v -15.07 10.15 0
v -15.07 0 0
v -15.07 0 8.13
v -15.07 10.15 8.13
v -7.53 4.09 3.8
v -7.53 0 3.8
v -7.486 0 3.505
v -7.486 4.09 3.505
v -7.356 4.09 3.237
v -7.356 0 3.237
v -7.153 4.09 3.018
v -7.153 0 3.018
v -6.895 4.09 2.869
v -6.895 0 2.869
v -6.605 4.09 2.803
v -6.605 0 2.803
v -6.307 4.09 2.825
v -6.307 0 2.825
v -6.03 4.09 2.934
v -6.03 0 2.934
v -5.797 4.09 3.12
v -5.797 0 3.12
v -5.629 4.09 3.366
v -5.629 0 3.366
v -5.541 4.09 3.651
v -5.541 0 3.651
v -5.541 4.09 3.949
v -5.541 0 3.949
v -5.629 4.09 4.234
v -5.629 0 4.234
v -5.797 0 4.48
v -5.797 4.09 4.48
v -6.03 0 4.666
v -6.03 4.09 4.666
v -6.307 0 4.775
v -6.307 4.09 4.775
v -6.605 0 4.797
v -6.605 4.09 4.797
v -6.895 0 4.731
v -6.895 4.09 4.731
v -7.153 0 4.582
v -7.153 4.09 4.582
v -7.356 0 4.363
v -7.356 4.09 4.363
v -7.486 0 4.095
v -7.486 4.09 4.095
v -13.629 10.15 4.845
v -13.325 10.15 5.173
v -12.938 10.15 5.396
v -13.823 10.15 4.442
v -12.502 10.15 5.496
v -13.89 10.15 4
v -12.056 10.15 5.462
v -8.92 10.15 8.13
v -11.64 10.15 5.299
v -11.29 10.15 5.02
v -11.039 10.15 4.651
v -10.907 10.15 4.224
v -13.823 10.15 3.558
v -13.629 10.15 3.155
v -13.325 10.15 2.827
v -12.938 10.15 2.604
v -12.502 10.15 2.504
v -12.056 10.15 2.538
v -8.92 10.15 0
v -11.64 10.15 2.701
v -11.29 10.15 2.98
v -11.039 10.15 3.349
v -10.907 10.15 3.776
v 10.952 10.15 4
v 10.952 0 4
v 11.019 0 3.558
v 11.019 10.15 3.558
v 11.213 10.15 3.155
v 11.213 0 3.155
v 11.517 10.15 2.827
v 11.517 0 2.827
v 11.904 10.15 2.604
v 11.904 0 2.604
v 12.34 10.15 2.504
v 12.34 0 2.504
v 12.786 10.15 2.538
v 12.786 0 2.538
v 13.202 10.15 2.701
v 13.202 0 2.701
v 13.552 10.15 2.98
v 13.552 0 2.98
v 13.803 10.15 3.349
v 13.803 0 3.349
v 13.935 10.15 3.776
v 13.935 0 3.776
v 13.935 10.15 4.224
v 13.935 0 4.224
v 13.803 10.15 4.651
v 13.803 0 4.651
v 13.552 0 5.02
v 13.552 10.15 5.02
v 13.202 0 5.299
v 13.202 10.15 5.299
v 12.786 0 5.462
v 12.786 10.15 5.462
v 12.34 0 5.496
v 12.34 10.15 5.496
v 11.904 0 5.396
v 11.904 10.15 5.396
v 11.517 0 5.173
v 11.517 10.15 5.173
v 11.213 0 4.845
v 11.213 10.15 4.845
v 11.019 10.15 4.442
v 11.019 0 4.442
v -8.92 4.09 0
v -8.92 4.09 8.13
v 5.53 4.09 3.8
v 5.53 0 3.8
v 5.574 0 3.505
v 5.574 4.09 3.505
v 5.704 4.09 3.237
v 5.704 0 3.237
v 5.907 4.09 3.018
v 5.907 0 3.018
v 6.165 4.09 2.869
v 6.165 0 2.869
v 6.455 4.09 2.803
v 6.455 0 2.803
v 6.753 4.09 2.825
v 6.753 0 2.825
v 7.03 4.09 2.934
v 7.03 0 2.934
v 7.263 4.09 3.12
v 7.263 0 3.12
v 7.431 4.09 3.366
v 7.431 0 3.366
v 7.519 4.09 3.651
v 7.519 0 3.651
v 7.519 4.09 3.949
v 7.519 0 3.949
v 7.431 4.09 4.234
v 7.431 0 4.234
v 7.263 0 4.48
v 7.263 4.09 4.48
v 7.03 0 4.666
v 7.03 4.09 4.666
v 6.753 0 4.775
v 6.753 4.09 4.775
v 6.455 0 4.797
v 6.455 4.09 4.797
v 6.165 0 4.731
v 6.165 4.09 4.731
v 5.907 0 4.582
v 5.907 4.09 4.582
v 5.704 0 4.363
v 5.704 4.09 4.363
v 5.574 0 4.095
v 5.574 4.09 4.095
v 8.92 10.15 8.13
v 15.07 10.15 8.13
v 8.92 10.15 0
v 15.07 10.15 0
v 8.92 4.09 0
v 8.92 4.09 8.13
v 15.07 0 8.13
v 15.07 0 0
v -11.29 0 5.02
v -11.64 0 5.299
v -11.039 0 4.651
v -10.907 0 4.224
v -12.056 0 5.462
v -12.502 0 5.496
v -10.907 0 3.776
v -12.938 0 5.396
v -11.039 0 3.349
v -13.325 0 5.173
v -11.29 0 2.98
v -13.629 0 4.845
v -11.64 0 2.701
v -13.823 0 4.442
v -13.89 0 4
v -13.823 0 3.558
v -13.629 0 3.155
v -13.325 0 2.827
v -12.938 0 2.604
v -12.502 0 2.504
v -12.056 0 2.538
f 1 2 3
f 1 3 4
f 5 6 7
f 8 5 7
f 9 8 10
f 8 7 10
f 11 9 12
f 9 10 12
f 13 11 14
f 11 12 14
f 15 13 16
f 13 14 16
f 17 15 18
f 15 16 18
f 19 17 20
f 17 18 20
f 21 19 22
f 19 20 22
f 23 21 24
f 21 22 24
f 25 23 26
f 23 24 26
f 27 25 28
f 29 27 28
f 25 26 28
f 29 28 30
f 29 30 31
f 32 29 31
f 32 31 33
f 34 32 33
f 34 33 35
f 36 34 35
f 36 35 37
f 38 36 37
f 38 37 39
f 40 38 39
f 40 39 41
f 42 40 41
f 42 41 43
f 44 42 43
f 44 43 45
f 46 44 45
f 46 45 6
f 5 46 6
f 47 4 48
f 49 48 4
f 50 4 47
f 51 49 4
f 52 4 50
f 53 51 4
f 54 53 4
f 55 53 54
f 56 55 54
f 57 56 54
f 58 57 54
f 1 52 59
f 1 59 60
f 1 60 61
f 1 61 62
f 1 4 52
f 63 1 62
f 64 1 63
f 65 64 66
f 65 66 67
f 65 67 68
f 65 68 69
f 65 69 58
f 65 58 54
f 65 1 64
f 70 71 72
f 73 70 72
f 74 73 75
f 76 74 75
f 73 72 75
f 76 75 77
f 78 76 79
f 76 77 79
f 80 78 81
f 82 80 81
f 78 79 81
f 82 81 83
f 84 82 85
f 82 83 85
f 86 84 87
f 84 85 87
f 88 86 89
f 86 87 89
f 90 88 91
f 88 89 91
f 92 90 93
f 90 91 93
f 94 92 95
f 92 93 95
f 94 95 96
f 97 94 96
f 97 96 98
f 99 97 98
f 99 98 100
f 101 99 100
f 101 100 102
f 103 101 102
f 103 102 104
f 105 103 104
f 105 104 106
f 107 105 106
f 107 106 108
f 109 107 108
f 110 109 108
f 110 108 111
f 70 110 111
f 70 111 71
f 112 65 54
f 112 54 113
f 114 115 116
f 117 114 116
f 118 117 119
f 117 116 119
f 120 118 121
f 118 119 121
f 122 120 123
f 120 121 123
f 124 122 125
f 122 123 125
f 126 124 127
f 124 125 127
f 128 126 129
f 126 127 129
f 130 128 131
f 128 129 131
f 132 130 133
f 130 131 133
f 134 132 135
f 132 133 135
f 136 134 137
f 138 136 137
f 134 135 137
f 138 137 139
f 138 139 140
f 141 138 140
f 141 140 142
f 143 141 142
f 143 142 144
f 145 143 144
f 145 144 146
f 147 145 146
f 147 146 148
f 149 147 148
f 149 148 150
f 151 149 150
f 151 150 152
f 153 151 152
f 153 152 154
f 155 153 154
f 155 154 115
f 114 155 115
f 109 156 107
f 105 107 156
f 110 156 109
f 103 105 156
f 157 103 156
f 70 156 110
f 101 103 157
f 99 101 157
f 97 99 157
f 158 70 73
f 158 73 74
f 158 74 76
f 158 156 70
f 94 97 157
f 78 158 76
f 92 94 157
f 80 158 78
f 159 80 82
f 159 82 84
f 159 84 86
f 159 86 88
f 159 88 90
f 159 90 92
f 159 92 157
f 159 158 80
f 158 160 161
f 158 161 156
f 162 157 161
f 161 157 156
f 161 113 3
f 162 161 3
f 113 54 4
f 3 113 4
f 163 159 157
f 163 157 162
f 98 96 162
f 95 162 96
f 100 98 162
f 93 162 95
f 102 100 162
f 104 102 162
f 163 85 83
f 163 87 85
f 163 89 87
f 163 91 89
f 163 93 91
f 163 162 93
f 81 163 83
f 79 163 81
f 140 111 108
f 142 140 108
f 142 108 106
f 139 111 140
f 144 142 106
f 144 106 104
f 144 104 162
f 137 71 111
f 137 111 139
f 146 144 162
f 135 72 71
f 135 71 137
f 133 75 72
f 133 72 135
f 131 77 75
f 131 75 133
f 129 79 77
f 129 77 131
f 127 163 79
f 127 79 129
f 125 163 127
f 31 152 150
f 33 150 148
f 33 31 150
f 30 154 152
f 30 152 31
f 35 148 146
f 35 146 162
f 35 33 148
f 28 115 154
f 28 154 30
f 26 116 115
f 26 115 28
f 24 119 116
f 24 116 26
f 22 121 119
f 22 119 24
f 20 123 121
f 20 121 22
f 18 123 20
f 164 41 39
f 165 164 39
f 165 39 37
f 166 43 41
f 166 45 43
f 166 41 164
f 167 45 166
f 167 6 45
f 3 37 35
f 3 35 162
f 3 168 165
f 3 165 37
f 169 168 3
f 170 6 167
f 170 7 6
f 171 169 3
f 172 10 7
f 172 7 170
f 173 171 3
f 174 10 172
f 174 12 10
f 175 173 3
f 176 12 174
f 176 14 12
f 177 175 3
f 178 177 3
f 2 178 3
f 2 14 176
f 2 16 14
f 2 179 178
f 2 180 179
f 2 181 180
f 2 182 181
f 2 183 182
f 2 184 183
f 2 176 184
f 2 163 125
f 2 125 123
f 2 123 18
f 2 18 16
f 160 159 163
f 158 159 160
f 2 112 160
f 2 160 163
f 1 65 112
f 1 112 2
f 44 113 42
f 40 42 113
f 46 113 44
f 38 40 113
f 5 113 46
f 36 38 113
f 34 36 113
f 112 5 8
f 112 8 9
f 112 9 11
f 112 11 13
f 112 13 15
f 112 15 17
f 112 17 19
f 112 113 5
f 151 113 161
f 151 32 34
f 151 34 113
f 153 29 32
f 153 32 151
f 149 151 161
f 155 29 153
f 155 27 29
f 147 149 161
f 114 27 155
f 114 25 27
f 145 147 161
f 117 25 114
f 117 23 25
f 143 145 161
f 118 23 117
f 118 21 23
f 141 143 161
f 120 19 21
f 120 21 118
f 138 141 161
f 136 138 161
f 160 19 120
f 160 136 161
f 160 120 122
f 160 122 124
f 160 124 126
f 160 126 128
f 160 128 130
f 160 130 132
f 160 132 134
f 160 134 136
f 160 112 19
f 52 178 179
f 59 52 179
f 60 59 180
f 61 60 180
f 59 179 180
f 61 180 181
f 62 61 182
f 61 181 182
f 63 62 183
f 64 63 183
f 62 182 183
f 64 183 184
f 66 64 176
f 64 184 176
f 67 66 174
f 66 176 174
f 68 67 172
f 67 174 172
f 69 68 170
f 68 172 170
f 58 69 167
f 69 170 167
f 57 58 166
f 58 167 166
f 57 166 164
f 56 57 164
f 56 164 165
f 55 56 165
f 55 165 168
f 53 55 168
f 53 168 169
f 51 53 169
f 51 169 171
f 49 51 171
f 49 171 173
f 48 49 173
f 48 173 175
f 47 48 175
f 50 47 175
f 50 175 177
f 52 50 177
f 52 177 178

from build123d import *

# Parameters (mm, degrees)
BOSS_EXTRUDE1_DEPTH       = 8.13
F_3_0MM_DOWEL_HOLE1_D     = 3
F_3_0MM_DOWEL_HOLE1_DEPTH = 35
F_3_0MM_DOWEL_HOLE1_TIP   = 0.901290929
F_2_0MM_DOWEL_HOLE1_D     = 2
F_2_0MM_DOWEL_HOLE1_DEPTH = 35
F_2_0MM_DOWEL_HOLE1_TIP   = 0.600860619


with BuildPart() as part:
    # Sketch1 → Boss-Extrude1 (new body)
    with BuildSketch(Plane.XY):
        Polygon((-15.07, 0), (-15.07, 10.15), (-8.92, 10.15), (-8.92, 4.09), (8.92, 4.09), (8.92, 10.15), (15.07, 10.15), (15.07, 0), align=None)
    extrude(amount=BOSS_EXTRUDE1_DEPTH)

    # Ø3.0mm Dowel Hole1
    with Locations(Plane(origin=(0, 10.15, 0), x_dir=(1, 0, 0), z_dir=(0, 1, 0))):
        with Locations((-12.39, -4), (12.452, -4)):
            Hole(F_3_0MM_DOWEL_HOLE1_D / 2, depth=F_3_0MM_DOWEL_HOLE1_DEPTH)
            with Locations((0, 0, -(F_3_0MM_DOWEL_HOLE1_DEPTH + F_3_0MM_DOWEL_HOLE1_TIP / 2))):  # 118° drill point
                Cone(0, F_3_0MM_DOWEL_HOLE1_D / 2, F_3_0MM_DOWEL_HOLE1_TIP, mode=Mode.SUBTRACT)

    # Ø2.0mm Dowel Hole1
    with Locations(Plane(origin=(0, 4.09, 0), x_dir=(1, 0, 0), z_dir=(0, 1, 0))):
        with Locations((-6.53, -3.8), (6.53, -3.8)):
            Hole(F_2_0MM_DOWEL_HOLE1_D / 2, depth=F_2_0MM_DOWEL_HOLE1_DEPTH)
            with Locations((0, 0, -(F_2_0MM_DOWEL_HOLE1_DEPTH + F_2_0MM_DOWEL_HOLE1_TIP / 2))):  # 118° drill point
                Cone(0, F_2_0MM_DOWEL_HOLE1_D / 2, F_2_0MM_DOWEL_HOLE1_TIP, mode=Mode.SUBTRACT)


solid = part.part
